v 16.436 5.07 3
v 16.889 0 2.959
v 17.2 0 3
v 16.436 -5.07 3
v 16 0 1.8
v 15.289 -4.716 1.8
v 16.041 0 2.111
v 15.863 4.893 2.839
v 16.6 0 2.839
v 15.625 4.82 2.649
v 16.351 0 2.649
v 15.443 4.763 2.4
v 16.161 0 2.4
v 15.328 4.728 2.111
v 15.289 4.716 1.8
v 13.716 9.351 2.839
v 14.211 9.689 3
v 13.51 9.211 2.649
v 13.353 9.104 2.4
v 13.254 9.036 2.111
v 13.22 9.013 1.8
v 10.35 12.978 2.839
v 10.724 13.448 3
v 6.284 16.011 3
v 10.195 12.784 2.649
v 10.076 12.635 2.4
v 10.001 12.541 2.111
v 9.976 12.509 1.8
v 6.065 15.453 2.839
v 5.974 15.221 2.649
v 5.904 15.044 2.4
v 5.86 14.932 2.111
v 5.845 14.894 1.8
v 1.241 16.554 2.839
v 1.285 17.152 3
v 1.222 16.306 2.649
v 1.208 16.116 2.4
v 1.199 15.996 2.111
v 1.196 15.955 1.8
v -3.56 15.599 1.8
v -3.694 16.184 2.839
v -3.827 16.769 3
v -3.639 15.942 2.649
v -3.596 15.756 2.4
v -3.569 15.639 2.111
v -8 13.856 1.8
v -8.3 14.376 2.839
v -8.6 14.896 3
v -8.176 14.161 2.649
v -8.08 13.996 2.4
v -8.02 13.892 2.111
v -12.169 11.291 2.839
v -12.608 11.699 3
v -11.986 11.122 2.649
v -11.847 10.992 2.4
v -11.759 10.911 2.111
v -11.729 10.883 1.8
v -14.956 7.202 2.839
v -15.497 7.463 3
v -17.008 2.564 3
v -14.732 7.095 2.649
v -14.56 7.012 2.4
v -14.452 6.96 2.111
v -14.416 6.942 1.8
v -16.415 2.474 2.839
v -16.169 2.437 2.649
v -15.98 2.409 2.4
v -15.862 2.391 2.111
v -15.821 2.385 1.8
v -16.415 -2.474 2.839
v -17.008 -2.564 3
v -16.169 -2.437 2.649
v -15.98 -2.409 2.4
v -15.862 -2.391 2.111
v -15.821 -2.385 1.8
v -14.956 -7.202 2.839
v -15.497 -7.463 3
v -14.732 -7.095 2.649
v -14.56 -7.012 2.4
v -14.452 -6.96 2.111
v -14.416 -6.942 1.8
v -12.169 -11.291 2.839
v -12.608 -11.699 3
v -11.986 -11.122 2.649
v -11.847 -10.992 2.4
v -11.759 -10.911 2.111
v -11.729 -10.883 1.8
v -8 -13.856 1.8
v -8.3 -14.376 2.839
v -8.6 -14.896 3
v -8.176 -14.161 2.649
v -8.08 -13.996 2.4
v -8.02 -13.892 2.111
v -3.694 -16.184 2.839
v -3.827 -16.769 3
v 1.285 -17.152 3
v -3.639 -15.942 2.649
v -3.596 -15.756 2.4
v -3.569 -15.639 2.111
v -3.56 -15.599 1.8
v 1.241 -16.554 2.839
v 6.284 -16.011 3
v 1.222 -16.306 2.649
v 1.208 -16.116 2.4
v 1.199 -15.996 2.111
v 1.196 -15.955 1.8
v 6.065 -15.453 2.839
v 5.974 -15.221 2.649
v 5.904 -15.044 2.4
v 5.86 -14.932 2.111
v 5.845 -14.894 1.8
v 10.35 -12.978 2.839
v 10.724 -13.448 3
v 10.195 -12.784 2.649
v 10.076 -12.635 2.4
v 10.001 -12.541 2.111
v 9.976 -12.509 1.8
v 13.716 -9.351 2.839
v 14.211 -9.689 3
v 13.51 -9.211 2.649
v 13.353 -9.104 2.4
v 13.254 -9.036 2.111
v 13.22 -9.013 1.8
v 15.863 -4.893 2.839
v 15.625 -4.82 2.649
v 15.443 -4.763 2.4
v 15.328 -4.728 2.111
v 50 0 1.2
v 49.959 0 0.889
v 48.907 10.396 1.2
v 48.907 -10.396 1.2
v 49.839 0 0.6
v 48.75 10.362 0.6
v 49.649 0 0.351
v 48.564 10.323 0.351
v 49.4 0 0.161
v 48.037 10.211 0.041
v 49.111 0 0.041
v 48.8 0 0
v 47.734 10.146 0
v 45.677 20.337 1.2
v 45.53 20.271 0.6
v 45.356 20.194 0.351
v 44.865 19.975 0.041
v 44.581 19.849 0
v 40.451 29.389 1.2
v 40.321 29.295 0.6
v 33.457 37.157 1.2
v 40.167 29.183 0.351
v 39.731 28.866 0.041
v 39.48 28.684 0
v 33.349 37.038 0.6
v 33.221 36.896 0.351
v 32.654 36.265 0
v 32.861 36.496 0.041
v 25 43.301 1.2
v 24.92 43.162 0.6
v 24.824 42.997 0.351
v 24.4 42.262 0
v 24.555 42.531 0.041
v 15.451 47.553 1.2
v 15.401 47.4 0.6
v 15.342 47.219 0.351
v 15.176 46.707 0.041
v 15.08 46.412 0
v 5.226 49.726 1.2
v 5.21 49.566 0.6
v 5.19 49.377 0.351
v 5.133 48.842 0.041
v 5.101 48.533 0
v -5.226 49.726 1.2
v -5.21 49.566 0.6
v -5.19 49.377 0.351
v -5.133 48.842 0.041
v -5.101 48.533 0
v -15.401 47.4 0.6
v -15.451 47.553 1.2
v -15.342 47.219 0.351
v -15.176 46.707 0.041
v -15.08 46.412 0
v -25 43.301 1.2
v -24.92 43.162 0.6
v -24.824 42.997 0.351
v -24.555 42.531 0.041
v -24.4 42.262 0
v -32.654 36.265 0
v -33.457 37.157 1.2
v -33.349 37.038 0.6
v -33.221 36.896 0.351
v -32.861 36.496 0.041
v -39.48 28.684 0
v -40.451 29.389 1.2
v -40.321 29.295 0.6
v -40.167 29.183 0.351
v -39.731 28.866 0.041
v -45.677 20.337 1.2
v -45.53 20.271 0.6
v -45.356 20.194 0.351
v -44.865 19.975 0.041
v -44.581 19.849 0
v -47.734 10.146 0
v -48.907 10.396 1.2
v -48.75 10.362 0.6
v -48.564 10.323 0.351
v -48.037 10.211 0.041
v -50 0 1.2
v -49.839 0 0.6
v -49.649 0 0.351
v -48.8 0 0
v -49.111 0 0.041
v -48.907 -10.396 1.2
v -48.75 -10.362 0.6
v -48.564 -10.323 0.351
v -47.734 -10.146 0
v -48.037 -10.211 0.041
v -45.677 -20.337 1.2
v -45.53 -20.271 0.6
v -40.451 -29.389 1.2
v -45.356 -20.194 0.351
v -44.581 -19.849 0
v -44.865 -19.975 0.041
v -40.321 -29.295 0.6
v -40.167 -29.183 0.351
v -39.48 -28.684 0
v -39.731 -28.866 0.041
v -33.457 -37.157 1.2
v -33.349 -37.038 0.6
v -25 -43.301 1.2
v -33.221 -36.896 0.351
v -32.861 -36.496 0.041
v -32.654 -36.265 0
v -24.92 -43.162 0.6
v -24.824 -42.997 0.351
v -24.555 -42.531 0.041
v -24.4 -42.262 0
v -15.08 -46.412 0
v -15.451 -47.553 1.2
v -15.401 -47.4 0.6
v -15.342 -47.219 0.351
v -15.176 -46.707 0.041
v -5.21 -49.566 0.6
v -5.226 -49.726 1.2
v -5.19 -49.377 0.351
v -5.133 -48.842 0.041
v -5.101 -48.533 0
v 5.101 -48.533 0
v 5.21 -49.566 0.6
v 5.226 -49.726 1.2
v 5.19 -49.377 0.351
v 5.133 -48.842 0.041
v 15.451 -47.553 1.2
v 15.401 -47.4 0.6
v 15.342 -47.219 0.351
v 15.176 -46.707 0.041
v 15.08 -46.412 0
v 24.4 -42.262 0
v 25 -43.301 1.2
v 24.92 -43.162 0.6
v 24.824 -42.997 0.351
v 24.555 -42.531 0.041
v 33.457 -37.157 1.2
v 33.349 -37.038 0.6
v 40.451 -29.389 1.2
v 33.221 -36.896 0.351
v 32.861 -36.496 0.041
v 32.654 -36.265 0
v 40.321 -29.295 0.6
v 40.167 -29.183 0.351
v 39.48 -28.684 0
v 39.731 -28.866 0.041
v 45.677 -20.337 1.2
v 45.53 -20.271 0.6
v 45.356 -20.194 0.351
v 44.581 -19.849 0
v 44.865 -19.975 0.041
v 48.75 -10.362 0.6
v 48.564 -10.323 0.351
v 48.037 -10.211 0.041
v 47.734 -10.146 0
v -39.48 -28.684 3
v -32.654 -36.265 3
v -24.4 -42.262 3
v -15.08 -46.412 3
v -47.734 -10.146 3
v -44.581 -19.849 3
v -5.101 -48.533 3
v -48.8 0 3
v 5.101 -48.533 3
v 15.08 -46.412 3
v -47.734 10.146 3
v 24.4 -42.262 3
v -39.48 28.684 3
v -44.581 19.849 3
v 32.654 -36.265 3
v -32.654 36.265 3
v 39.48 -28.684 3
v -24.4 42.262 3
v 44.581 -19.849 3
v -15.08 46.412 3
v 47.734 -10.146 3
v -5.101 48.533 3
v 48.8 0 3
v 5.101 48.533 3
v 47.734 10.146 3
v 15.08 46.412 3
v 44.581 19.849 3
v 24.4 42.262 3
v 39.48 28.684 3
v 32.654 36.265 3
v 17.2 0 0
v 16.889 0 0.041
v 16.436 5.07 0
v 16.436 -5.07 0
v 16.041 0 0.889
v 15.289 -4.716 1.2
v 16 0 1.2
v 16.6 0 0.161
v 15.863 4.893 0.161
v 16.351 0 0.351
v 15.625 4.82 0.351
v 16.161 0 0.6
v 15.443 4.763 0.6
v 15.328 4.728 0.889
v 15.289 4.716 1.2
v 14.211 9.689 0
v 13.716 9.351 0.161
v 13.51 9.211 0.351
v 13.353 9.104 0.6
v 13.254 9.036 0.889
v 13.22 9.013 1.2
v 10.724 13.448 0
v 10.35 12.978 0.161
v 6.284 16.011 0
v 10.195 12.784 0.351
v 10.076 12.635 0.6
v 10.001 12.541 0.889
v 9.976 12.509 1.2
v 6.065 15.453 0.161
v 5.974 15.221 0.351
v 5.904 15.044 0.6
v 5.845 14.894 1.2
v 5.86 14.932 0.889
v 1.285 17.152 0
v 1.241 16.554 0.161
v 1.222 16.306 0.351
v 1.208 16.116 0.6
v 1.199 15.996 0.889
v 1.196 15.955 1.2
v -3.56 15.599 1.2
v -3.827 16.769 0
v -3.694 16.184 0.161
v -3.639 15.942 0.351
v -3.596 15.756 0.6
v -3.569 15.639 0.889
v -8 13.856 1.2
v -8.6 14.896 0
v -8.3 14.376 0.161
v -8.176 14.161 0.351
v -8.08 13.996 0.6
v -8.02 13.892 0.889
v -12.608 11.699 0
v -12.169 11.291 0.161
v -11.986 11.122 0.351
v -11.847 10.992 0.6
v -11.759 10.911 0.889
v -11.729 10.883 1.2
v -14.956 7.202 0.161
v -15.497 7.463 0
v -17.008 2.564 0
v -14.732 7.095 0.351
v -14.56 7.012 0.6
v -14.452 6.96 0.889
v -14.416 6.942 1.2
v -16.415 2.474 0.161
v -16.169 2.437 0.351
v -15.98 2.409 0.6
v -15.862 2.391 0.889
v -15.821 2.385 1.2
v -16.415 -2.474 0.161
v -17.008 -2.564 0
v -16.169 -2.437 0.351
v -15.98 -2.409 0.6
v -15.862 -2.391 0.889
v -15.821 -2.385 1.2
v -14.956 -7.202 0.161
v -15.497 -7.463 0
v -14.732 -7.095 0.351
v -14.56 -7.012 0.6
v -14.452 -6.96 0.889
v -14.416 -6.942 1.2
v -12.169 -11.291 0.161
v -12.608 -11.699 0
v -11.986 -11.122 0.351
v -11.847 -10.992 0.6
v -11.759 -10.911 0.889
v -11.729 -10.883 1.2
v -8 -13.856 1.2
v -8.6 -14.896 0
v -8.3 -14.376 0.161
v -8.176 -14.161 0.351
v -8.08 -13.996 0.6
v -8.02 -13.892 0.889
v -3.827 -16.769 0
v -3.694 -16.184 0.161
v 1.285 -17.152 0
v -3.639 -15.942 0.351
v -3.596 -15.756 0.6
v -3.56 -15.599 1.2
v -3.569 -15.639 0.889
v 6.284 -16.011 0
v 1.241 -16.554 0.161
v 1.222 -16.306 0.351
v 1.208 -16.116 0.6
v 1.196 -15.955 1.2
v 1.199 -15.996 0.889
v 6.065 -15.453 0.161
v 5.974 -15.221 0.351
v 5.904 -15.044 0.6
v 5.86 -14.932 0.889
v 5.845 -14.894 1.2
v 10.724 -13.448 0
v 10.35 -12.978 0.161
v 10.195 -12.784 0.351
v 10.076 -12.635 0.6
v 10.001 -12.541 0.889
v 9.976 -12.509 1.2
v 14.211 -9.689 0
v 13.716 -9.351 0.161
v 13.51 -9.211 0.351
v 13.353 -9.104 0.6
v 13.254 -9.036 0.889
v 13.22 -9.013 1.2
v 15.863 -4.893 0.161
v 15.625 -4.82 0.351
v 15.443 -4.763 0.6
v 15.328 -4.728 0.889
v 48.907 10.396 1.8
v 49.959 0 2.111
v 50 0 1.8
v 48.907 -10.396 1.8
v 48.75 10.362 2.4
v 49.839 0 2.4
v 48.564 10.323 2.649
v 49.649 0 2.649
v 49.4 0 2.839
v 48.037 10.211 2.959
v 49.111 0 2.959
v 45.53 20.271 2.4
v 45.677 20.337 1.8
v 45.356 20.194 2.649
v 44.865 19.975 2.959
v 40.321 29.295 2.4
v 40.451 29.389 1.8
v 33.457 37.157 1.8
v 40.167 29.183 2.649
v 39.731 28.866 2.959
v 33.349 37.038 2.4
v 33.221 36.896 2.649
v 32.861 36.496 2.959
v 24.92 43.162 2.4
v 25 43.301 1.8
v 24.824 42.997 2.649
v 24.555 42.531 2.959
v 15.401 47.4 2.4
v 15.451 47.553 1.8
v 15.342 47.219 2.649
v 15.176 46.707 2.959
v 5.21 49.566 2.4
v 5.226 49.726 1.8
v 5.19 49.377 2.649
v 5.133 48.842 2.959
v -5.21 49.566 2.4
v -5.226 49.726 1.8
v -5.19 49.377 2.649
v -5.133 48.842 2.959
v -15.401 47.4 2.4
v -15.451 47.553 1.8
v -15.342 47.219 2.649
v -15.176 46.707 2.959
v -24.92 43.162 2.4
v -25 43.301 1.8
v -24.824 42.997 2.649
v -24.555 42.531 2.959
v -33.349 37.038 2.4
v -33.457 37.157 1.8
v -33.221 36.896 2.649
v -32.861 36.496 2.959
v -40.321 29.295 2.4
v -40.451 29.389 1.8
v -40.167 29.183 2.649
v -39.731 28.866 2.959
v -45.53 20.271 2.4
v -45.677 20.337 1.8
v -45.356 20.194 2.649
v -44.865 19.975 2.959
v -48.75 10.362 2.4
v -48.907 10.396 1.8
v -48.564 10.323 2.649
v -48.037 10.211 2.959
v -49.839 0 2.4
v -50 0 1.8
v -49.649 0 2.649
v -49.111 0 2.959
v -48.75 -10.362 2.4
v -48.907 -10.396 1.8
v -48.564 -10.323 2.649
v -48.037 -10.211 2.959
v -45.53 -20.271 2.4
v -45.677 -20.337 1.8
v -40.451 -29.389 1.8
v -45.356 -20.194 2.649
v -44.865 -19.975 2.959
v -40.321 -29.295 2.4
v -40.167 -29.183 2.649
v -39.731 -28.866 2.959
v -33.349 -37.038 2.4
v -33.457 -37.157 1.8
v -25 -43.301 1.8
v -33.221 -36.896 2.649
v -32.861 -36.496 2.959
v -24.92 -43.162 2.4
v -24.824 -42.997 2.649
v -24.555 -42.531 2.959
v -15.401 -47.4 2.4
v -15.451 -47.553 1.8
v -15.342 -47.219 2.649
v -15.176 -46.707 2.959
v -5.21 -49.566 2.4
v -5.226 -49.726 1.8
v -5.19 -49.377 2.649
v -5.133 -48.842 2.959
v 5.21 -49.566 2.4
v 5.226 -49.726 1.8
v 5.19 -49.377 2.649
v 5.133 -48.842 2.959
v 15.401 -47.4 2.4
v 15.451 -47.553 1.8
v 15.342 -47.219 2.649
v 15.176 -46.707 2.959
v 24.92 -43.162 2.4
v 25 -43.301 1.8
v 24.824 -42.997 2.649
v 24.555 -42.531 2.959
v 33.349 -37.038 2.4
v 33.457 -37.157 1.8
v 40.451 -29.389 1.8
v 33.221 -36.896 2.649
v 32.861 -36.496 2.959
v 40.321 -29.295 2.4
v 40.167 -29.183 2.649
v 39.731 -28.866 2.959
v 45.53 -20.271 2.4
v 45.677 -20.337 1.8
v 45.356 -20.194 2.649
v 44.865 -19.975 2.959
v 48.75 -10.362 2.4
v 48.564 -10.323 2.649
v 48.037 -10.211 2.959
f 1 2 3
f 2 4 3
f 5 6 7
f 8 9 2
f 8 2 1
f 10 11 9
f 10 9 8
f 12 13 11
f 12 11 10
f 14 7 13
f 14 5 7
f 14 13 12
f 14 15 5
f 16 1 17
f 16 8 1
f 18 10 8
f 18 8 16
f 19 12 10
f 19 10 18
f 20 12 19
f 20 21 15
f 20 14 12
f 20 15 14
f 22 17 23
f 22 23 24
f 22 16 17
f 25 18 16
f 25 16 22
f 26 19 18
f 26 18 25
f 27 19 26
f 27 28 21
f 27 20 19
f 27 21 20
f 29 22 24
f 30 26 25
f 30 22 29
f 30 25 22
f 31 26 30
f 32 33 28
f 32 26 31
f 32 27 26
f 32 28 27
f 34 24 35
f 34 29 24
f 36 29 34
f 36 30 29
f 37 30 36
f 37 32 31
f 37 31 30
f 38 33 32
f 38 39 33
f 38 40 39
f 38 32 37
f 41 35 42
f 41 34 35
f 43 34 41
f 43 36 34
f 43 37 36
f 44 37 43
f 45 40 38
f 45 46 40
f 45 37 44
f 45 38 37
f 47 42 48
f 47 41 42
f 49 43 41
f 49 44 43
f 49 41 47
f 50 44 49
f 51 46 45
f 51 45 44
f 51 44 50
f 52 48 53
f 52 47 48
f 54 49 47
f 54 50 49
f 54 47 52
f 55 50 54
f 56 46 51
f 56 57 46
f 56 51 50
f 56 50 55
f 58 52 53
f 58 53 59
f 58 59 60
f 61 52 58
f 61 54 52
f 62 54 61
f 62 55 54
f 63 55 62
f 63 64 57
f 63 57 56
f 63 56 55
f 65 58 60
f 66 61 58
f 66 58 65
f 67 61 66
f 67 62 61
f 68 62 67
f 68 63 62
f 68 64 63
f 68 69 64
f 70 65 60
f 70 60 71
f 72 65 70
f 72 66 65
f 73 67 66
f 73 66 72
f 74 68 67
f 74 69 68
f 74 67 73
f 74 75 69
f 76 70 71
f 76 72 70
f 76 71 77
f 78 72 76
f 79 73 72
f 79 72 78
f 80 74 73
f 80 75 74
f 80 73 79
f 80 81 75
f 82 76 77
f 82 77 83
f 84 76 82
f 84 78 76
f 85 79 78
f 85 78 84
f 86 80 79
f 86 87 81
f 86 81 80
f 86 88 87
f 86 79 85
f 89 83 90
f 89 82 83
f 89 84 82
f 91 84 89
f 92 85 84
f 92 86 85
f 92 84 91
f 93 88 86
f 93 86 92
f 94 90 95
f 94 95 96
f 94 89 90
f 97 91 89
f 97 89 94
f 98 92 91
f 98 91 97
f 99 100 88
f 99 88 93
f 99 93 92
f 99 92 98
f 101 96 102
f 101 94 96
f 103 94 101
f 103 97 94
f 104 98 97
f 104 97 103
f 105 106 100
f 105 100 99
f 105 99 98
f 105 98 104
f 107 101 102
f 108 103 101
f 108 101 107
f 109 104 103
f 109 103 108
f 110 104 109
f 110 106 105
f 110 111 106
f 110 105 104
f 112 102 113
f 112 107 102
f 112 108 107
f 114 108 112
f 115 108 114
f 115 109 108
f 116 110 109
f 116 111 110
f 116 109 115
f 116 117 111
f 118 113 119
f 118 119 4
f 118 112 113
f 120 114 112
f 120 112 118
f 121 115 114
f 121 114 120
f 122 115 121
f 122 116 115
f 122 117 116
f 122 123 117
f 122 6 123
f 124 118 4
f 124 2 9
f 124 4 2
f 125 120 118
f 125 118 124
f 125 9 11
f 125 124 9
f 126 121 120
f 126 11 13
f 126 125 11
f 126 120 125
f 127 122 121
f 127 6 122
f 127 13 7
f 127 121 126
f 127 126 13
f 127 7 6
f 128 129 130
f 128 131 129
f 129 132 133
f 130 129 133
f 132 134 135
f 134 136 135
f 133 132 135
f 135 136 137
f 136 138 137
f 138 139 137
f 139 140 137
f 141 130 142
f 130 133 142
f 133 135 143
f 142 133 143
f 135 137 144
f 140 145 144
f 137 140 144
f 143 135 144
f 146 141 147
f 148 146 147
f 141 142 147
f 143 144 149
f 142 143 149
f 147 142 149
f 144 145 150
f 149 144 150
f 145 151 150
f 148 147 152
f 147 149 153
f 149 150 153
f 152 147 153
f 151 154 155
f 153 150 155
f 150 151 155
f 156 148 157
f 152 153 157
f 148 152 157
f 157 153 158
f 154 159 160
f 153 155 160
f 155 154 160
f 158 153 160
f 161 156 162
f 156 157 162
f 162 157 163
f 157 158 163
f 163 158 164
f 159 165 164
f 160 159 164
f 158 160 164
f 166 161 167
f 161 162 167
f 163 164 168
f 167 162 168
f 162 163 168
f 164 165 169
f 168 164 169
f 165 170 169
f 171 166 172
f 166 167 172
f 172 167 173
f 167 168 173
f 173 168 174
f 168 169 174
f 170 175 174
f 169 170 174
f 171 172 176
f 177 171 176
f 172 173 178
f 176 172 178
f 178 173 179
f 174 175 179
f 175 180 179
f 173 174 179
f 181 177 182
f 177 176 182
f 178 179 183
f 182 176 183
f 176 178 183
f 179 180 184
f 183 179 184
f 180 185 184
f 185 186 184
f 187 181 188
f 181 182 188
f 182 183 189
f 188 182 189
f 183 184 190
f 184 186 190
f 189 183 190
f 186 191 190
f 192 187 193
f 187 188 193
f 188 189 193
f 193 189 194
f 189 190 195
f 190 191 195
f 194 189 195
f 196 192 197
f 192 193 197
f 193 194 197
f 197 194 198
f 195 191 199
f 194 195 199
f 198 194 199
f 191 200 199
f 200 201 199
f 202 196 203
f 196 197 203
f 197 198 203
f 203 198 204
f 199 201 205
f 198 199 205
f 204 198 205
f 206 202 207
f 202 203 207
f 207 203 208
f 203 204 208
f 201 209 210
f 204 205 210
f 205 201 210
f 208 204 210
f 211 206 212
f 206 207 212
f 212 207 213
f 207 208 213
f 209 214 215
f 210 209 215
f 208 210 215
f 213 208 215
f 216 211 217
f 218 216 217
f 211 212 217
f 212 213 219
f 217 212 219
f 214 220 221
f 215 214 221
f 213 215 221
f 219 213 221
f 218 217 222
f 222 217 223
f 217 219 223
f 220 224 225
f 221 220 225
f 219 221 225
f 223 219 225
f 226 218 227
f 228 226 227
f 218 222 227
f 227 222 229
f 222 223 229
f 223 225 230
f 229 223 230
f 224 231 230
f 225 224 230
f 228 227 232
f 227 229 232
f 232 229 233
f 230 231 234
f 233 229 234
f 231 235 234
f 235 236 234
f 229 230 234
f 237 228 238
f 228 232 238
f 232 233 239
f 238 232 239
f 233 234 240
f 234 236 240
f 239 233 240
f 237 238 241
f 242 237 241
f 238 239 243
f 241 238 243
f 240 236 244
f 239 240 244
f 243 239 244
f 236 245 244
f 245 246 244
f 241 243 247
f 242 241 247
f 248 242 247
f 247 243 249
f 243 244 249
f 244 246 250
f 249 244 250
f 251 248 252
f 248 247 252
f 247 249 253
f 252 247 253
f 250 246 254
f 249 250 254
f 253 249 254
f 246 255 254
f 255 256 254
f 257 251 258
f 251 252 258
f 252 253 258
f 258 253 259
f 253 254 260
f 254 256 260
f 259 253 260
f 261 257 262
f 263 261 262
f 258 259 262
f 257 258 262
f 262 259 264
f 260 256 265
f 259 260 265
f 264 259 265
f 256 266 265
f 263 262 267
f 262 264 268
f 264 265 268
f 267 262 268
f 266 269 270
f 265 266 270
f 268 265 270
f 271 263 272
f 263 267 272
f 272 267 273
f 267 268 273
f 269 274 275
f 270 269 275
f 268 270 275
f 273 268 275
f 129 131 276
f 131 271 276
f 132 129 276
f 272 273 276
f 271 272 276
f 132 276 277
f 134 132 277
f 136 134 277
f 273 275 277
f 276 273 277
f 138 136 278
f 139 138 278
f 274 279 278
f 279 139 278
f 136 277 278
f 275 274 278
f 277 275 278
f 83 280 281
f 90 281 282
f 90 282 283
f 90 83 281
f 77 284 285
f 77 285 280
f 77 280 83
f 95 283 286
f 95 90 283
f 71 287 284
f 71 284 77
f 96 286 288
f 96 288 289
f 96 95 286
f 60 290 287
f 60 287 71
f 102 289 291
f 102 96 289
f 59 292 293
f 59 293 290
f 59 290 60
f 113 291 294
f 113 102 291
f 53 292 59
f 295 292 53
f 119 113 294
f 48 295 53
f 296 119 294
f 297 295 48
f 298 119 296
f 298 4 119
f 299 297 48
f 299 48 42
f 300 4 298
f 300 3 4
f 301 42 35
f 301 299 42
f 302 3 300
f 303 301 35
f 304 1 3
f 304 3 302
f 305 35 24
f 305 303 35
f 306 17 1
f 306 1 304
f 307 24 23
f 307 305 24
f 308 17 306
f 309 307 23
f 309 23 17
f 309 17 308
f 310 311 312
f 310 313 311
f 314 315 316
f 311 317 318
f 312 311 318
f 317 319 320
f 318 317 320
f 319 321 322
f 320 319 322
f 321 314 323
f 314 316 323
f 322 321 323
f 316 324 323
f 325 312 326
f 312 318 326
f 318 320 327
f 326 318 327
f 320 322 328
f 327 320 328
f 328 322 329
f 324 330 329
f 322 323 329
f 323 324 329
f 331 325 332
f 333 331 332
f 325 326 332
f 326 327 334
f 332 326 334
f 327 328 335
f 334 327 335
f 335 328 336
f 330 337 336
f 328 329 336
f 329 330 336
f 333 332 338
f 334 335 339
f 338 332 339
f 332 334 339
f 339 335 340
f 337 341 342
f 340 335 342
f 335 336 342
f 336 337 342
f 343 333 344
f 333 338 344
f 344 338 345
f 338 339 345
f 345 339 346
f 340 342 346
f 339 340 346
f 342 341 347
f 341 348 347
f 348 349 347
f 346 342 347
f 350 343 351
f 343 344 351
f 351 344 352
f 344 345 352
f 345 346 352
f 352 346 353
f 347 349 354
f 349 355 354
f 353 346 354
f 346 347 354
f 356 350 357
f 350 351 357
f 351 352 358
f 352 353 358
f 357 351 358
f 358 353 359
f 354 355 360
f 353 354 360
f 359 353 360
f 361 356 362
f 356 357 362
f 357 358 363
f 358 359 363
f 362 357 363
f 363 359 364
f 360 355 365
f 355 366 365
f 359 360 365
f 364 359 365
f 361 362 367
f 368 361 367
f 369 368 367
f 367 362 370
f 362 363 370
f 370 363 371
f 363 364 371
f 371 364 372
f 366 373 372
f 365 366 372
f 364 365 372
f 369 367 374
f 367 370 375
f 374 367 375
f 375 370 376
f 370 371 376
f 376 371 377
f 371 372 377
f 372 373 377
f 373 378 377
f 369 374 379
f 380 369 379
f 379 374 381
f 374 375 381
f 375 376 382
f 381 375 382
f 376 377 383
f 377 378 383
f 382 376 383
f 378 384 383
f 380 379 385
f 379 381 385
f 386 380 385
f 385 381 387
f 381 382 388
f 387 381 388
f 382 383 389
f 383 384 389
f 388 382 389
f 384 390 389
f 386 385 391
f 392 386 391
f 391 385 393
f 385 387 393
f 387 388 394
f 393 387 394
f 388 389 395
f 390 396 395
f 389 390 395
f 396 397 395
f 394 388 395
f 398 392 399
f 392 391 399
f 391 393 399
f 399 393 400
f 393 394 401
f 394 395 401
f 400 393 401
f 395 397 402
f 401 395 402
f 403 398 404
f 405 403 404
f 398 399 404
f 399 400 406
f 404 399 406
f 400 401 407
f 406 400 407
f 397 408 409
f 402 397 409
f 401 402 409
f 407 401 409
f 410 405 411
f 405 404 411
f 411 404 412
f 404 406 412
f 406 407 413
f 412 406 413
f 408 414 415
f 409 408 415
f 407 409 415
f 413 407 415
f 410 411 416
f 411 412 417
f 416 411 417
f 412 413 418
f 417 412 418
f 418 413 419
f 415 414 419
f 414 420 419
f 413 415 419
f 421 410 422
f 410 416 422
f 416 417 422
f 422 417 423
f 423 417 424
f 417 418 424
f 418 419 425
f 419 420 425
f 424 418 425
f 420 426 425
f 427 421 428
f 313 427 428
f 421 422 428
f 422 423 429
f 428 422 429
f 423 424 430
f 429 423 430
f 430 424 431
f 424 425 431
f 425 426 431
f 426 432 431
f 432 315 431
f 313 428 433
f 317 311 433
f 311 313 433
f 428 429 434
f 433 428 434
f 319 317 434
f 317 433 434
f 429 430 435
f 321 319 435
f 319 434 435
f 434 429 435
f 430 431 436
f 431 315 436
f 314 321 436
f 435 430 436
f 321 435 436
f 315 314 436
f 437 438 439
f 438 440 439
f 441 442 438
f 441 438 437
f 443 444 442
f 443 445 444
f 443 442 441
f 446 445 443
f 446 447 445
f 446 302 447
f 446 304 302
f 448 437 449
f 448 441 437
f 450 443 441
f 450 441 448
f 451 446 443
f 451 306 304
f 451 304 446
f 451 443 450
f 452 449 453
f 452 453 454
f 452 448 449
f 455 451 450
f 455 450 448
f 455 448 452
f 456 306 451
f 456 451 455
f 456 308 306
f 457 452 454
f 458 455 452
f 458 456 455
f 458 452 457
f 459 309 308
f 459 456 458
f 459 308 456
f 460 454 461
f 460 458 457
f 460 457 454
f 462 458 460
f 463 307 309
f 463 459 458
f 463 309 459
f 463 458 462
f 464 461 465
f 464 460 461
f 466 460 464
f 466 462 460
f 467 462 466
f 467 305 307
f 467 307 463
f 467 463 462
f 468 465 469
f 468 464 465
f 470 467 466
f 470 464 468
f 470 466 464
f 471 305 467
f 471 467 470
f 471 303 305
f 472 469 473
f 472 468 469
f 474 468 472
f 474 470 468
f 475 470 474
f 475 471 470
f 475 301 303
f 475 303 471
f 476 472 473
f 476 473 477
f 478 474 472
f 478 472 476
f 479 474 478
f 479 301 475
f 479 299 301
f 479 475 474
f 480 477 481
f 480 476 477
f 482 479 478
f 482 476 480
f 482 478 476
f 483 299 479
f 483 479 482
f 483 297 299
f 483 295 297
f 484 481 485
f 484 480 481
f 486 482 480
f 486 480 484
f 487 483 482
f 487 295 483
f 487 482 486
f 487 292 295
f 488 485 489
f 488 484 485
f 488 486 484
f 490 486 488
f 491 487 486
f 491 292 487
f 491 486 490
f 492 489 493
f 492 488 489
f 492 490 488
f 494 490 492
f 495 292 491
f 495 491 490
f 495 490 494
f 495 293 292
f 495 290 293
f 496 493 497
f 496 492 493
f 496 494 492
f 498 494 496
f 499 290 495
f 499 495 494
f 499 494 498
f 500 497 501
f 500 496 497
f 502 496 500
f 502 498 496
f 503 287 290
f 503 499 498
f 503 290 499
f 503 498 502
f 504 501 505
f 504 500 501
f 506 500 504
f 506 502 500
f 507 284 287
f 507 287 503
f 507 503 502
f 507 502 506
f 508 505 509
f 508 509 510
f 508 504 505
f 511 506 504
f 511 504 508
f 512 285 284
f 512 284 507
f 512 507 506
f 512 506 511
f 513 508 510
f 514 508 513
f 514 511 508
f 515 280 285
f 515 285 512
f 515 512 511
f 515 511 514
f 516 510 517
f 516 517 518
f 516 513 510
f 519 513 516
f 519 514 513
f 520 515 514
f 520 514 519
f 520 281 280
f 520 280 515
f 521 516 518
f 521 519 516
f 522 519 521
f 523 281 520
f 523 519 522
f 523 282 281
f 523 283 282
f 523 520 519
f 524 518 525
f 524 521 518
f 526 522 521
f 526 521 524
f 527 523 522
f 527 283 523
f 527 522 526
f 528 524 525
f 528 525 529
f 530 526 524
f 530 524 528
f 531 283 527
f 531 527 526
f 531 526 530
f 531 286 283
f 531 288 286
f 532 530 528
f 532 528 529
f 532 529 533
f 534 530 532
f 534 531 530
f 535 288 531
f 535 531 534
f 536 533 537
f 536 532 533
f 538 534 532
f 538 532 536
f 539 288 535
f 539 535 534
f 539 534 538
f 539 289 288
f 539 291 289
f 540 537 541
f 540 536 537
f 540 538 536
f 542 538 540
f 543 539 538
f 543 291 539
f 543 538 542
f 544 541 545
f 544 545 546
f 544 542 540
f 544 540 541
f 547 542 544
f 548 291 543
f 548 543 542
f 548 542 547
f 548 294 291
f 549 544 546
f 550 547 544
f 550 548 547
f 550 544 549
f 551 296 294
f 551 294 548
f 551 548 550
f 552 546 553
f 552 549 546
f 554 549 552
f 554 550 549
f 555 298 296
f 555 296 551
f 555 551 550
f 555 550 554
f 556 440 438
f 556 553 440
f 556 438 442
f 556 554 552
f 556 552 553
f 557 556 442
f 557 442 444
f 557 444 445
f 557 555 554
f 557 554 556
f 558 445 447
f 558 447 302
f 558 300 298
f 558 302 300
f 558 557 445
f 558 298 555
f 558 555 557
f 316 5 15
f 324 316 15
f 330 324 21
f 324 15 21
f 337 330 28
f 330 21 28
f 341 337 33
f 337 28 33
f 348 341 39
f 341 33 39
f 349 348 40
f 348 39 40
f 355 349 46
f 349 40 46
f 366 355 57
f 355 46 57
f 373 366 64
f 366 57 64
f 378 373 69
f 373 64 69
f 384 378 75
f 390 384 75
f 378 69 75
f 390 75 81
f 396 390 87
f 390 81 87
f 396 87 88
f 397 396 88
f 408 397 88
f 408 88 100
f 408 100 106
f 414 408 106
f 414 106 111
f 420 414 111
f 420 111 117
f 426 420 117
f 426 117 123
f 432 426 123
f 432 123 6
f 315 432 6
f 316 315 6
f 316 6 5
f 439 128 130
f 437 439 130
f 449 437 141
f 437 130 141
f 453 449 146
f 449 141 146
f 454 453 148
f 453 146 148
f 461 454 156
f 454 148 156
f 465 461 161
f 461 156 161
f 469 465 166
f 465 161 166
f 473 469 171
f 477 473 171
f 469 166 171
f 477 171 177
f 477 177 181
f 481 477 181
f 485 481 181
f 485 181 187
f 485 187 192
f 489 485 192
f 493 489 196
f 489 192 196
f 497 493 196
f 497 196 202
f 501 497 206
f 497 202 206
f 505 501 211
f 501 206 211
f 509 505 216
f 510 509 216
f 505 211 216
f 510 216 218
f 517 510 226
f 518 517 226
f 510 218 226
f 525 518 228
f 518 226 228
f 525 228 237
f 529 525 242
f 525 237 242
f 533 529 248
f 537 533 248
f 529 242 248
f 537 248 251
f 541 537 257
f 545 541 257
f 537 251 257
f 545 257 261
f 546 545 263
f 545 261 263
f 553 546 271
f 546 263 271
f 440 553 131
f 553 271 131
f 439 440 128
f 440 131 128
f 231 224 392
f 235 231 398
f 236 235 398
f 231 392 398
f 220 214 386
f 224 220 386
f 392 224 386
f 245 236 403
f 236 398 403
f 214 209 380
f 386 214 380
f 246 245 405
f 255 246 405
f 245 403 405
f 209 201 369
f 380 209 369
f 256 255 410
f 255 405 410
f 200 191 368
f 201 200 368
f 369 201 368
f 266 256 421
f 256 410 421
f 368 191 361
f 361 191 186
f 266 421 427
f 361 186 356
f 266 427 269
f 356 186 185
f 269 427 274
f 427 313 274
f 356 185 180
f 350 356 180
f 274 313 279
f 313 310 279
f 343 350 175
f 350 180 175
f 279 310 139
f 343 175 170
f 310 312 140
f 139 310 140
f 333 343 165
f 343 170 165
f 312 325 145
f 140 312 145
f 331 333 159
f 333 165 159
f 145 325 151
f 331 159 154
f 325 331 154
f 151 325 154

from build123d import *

# Parameters (mm, degrees)
SKETCH_R     = 50
PAD_DEPTH    = 3
SKETCH001_R  = 16
POCKET_DEPTH = 3.001
FILLET_R     = 1.2


with BuildPart() as part:
    # Sketch → Pad (new body)
    with BuildSketch(Plane.XY):
        Circle(SKETCH_R)
    extrude(amount=PAD_DEPTH)

    # Sketch001 (on Face3 of Pad) → Pocket (cut, through all)
    with BuildSketch(Plane.XY.offset(3)):
        Circle(SKETCH001_R)
    extrude(amount=-POCKET_DEPTH, mode=Mode.SUBTRACT)

    # Fillet
    fillet_edges = [part.edges().sort_by_distance(p)[0] for p in [
        (-16, 0, 3),
        (16, 0, 1.5),
        (-16, 0, 0),
        (50, 0, 1.5),
        (-50, 0, 0),
        (-50, 0, 3),
    ]]
    fillet(fillet_edges, radius=FILLET_R)


solid = part.part
